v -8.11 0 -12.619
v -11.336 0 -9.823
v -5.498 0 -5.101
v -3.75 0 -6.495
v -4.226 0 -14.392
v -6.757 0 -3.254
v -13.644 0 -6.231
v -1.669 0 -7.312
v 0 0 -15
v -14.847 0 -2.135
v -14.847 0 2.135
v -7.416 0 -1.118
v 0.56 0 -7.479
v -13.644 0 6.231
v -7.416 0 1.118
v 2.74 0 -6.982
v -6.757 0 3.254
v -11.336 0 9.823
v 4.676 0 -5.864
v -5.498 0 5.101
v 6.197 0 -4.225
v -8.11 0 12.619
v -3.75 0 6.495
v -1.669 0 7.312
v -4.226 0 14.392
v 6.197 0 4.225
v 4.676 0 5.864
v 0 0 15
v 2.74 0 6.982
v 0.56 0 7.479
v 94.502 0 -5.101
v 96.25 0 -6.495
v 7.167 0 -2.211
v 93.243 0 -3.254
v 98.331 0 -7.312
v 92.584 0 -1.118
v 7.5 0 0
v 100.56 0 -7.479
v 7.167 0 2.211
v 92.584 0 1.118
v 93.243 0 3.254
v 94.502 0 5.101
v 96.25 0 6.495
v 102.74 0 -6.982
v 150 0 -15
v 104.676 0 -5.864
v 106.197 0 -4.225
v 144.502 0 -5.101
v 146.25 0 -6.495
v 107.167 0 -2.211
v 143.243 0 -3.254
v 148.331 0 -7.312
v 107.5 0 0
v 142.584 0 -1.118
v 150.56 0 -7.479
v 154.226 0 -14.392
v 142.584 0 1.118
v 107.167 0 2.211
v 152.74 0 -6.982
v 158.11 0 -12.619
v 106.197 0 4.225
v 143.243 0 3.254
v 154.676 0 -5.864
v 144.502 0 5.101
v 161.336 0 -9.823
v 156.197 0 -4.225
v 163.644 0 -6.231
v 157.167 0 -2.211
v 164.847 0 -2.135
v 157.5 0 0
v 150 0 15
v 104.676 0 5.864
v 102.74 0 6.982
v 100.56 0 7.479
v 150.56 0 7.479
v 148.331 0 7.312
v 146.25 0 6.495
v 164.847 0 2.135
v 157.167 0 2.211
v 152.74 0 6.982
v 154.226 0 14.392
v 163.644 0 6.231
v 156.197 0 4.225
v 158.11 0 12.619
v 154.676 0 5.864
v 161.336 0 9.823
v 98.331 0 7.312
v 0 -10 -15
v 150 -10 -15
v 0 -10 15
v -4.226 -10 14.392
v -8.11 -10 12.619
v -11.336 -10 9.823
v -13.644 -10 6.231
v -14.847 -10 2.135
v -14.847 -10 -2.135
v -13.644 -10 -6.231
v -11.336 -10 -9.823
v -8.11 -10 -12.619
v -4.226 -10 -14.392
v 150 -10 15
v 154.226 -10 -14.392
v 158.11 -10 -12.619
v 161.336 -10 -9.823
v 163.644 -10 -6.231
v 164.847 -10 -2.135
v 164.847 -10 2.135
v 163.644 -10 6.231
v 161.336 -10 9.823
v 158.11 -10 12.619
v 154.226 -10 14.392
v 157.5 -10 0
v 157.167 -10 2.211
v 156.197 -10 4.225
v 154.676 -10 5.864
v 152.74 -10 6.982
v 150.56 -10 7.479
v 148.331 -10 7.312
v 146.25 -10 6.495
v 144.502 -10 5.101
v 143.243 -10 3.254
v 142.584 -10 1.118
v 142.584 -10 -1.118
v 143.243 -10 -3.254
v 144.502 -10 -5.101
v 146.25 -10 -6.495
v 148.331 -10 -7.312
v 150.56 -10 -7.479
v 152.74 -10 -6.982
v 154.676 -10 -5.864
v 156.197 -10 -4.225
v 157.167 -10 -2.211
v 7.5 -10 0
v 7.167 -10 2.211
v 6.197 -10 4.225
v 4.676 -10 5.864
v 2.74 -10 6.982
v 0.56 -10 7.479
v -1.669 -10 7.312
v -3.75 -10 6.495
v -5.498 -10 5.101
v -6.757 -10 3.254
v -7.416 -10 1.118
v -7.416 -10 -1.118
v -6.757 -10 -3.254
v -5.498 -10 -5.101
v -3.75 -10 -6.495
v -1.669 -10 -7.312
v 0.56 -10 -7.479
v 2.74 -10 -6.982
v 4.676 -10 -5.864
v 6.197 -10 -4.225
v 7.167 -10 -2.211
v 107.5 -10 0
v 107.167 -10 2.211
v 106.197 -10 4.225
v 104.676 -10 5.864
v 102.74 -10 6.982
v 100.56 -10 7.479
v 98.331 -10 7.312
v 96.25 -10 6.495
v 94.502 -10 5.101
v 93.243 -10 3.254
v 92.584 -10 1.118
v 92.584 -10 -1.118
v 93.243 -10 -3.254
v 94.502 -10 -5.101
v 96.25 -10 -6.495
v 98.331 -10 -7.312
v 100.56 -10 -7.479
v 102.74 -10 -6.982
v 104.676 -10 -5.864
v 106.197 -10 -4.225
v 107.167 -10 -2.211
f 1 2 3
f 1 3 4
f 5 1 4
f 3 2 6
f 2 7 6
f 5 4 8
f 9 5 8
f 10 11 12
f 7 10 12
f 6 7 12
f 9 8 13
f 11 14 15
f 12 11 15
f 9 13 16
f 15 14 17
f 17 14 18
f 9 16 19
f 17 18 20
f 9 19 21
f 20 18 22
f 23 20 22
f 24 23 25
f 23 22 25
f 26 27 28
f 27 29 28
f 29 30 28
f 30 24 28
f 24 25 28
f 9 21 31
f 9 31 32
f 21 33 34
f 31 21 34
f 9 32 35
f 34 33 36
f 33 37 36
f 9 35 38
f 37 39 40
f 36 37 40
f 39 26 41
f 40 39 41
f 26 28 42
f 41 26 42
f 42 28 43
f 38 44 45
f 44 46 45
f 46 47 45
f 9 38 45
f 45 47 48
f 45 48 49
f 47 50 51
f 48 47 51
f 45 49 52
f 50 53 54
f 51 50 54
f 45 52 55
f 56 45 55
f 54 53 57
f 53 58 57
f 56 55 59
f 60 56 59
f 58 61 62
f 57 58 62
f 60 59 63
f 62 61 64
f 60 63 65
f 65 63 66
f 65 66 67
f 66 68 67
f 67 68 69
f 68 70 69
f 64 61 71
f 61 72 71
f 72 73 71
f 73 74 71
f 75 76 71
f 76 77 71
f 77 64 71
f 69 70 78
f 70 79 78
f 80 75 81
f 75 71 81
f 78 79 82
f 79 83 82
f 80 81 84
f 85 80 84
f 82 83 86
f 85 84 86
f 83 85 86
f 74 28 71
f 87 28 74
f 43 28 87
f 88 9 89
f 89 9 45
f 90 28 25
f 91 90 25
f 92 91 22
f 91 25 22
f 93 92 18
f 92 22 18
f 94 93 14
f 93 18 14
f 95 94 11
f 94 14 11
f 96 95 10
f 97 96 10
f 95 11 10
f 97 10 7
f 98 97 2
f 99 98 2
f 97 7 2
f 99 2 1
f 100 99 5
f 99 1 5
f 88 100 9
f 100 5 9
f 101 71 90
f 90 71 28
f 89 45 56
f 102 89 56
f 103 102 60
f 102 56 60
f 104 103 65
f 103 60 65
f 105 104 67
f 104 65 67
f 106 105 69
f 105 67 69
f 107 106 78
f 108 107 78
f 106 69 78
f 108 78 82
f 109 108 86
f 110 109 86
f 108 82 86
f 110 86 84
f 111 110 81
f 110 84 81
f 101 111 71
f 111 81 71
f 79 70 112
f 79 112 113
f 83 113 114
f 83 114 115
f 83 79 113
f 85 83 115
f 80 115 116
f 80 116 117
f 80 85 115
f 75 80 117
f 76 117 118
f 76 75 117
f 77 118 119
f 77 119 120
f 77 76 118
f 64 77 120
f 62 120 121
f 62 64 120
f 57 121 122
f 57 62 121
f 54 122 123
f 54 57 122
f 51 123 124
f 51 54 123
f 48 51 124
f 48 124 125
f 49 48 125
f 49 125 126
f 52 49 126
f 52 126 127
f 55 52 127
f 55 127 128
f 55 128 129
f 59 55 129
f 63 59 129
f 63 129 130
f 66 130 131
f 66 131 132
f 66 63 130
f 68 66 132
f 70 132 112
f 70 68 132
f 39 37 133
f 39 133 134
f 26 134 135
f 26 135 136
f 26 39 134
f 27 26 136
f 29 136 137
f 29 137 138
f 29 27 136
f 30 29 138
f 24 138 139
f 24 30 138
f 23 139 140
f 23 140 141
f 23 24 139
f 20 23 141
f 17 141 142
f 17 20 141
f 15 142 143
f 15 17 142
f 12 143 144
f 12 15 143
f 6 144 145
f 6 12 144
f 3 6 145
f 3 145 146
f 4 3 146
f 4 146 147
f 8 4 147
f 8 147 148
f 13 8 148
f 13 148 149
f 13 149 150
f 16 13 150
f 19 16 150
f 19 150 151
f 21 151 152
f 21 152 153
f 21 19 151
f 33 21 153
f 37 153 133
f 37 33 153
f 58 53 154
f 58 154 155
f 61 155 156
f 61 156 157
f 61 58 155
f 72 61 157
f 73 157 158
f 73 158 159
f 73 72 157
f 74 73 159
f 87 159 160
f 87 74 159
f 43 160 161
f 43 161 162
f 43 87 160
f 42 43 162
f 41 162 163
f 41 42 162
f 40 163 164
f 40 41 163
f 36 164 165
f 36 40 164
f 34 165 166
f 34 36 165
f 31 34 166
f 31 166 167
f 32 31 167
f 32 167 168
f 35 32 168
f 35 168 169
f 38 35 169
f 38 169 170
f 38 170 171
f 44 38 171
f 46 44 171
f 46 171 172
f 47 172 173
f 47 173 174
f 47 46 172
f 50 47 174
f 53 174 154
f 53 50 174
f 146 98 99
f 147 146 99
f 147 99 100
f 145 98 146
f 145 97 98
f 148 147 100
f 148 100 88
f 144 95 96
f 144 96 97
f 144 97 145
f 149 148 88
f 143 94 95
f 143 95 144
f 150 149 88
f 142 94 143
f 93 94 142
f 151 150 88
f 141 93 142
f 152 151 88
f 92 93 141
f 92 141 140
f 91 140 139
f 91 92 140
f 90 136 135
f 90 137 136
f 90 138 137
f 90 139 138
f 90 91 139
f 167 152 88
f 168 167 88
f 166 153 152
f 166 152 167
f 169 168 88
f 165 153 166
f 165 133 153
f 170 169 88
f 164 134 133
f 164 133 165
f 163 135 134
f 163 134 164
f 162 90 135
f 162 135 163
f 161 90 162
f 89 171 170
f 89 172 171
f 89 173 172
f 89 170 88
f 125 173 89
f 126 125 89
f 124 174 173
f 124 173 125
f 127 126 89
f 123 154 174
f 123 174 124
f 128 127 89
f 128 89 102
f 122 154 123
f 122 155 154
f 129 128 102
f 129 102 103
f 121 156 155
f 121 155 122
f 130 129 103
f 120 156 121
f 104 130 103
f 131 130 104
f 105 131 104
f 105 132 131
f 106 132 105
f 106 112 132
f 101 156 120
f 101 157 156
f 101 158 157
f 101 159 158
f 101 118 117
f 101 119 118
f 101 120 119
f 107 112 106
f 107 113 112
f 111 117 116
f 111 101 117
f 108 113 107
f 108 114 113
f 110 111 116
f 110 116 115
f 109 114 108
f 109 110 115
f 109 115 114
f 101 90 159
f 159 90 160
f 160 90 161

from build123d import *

# Parameters (mm, degrees)
F0_R     = 7.5
F1_DEPTH = 10


with BuildPart() as f1:
    # F0 (on Front) → F1 (new body)
    with BuildSketch(Plane.XZ):
        with BuildLine():
            Line((150, 15), (0, 15))
            ThreePointArc((0, 15), (-15, 0), (0, -15))
            Line((0, -15), (150, -15))
            ThreePointArc((150, -15), (165, 0), (150, 15))
        make_face()
        Circle(F0_R, mode=Mode.SUBTRACT)
        with Locations((100, 0)):
            Circle(F0_R, mode=Mode.SUBTRACT)
        with Locations((150, 0)):
            Circle(F0_R, mode=Mode.SUBTRACT)
    extrude(amount=F1_DEPTH)


solid = f1.part
